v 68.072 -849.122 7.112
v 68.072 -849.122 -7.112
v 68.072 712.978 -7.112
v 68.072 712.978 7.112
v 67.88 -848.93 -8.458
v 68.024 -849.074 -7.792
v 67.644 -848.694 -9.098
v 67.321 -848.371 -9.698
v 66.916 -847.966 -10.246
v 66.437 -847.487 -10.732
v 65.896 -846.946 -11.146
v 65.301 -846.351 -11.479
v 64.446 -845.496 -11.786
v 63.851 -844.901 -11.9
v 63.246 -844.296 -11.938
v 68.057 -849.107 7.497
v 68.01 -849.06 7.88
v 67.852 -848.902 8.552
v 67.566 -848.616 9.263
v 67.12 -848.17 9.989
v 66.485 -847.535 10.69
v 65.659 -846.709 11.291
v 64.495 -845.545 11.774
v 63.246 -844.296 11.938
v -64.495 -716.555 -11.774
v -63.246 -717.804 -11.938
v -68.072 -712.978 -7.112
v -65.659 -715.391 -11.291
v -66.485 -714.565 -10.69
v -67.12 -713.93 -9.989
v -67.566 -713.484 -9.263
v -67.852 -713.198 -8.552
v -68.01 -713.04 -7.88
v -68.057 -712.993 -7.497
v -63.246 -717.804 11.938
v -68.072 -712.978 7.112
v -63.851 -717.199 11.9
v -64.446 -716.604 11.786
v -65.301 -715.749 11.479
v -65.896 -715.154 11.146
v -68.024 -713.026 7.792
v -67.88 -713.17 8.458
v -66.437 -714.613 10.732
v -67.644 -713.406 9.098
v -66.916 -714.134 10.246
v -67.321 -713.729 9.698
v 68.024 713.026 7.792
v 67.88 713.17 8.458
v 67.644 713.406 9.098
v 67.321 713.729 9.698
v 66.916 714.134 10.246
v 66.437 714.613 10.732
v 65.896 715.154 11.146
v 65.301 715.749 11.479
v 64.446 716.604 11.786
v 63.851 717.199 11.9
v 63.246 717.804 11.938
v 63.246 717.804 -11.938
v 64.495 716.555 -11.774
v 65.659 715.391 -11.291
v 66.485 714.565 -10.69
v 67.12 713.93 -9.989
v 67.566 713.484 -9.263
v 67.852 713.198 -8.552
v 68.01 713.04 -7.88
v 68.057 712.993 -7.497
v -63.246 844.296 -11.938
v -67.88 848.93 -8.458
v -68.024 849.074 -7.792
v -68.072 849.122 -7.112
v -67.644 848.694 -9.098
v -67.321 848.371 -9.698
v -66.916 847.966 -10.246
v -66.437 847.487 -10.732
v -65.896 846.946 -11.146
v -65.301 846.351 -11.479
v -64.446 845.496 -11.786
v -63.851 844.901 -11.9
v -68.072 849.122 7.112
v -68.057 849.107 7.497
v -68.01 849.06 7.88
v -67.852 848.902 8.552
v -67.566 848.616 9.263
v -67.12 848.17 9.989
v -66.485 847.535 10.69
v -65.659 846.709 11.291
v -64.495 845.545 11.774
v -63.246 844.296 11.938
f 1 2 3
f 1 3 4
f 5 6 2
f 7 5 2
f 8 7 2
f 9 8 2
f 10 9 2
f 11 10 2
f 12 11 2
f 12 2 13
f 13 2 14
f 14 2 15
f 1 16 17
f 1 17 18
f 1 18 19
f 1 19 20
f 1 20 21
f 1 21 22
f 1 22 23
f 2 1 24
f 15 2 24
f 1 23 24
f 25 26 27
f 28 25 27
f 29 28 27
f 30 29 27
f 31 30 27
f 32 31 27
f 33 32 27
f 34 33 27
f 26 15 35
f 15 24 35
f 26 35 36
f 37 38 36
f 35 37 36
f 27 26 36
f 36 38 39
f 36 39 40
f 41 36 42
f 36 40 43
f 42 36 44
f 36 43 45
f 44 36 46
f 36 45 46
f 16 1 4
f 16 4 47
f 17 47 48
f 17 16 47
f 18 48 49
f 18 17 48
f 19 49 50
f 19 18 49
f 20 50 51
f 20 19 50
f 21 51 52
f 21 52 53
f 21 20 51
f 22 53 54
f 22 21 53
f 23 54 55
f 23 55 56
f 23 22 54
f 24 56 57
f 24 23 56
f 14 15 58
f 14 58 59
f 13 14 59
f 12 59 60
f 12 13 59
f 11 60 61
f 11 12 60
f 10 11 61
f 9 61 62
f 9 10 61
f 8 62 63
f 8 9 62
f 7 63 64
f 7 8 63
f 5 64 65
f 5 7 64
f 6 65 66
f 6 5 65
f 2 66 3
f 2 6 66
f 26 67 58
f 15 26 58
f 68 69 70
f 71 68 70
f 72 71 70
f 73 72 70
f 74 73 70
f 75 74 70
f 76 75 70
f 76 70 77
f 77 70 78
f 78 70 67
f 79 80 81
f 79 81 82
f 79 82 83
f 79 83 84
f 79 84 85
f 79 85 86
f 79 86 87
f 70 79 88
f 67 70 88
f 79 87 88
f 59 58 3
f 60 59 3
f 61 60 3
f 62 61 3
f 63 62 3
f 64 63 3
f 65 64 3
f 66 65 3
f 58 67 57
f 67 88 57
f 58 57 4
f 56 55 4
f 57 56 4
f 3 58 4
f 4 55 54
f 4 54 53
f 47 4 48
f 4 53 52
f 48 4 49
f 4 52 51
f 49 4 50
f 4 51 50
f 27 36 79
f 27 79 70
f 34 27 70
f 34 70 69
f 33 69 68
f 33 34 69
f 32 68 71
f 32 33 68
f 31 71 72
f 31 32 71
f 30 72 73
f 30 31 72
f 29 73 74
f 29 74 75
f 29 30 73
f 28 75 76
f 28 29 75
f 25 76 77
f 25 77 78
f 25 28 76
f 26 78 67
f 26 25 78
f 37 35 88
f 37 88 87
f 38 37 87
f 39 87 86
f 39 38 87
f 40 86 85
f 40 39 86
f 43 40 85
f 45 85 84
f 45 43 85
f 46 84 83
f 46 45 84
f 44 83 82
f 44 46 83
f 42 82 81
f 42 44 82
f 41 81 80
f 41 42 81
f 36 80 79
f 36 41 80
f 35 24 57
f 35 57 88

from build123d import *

# Parameters (mm, degrees)
F1_DEPTH = 849.122
F3_DEPTH = 23.877


with BuildPart() as f1:
    # F0 (on Front) → F1 (new body, symmetric)
    with BuildSketch(Plane.XZ):
        with BuildLine():
            Line((63.246, 11.938), (-63.246, 11.938))
            ThreePointArc((-63.246, 11.938), (-66.658497, 10.524497), (-68.072, 7.112))
            Line((-68.072, 7.112), (-68.072, -7.112))
            ThreePointArc((-68.072, -7.112), (-66.658497, -10.524497), (-63.246, -11.938))
            Line((-63.246, -11.938), (63.246, -11.938))
            ThreePointArc((63.246, -11.938), (66.658497, -10.524497), (68.072, -7.112))
            Line((68.072, -7.112), (68.072, 7.112))
            ThreePointArc((68.072, 7.112), (66.658497, 10.524497), (63.246, 11.938))
        make_face()
    extrude(amount=F1_DEPTH, both=True)

    # F2 (on face) → F3 (cut, through all)
    with BuildSketch(Plane.XY.offset(11.938)):
        Polygon((-68.072, -849.122), (68.072, -849.122), (-68.072, -712.978), align=None)
        Polygon((68.072, 849.122), (-68.072, 849.122), (68.072, 712.978), align=None)
    extrude(amount=-F3_DEPTH, mode=Mode.SUBTRACT)


solid = f1.part
